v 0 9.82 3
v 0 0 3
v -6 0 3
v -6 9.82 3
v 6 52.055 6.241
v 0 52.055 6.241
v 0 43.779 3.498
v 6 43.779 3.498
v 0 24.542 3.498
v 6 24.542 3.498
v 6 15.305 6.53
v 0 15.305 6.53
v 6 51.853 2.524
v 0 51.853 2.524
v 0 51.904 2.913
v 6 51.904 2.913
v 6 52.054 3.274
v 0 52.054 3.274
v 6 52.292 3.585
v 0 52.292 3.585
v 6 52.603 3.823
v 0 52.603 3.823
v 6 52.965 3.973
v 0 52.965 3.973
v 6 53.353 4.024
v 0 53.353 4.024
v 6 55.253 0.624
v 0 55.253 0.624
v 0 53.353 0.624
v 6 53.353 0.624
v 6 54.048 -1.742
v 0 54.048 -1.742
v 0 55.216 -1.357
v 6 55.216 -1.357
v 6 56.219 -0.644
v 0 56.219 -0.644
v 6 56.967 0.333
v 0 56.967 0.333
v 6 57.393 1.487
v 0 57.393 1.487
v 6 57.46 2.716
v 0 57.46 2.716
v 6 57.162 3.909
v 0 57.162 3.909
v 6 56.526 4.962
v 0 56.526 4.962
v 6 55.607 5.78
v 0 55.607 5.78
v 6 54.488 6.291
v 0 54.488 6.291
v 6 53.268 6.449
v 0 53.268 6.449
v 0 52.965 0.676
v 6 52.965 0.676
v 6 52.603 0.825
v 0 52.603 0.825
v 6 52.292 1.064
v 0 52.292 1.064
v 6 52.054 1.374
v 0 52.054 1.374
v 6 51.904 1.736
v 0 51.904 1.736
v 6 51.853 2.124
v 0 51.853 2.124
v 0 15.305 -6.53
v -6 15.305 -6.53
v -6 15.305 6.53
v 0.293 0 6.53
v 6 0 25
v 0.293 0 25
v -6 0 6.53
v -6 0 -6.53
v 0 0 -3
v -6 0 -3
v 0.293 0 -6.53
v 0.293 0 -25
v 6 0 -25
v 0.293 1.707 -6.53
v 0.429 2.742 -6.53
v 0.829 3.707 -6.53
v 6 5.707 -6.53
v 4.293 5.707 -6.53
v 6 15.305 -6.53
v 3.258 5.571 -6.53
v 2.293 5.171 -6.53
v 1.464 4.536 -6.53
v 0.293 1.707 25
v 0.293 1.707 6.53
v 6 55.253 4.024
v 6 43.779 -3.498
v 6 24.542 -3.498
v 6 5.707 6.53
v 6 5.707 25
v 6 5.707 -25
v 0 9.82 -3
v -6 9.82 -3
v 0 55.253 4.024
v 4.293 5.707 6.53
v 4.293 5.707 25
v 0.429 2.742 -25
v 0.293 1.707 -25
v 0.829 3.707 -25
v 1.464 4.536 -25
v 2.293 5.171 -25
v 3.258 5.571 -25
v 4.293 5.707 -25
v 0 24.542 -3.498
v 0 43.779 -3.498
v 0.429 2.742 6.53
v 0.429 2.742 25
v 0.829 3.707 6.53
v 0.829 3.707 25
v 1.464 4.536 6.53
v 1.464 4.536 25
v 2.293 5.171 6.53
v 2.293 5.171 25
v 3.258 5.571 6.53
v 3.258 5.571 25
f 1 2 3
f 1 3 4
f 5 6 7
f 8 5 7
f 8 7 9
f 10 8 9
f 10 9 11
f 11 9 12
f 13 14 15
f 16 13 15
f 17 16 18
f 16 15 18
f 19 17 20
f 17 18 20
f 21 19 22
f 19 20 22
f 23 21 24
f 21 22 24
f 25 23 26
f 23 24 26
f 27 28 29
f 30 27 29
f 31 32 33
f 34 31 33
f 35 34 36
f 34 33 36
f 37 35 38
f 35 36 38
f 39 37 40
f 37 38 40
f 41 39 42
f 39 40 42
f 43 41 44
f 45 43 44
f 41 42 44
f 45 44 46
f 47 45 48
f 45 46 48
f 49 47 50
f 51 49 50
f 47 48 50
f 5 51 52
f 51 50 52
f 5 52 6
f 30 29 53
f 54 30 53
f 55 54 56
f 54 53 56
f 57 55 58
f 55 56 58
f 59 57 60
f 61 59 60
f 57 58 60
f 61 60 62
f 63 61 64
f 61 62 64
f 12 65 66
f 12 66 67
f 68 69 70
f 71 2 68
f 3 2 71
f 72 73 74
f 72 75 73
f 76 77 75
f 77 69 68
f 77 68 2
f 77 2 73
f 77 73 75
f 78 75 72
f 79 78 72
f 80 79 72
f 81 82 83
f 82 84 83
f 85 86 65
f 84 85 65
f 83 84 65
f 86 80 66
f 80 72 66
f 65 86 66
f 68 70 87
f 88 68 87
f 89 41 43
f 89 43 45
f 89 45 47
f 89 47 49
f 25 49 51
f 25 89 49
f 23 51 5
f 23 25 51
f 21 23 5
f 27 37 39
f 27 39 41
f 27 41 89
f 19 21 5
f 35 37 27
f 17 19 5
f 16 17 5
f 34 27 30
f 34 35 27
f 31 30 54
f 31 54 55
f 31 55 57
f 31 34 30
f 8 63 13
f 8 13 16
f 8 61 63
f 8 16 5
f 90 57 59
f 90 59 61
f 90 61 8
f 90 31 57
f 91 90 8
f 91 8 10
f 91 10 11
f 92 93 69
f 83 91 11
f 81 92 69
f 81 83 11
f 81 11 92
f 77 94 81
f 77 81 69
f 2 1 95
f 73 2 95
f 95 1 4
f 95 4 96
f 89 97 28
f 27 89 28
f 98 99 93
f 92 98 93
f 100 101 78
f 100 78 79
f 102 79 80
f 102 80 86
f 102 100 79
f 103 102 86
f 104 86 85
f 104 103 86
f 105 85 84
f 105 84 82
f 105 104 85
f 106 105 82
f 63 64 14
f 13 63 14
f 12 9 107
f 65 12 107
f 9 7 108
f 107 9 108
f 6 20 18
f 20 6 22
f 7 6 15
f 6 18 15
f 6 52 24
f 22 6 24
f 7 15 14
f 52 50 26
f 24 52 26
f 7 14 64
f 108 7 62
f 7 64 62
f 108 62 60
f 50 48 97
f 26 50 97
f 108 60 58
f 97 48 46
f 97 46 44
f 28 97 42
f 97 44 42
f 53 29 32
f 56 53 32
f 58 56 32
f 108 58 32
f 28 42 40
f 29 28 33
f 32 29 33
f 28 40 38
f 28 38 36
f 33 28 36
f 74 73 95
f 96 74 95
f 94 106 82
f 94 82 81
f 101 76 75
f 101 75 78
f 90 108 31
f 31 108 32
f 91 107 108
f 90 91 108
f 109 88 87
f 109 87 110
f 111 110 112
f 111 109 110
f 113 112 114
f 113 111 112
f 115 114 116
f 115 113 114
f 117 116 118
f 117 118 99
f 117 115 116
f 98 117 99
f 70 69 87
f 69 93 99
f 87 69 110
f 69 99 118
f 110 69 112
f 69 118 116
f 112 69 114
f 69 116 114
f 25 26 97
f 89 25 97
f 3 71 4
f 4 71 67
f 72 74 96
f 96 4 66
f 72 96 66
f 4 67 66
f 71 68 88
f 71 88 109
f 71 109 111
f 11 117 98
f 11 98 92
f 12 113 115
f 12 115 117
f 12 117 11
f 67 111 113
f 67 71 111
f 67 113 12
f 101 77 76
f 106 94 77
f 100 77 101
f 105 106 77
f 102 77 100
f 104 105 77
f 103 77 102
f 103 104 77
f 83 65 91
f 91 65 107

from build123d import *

# Parameters (mm, degrees)
SKETCH1_W                = 3.530112864
SKETCH1_H                = 9.82
BOSS_EXTRUDE2_DEPTH      = 6
SKETCH1_4_W              = 6
SKETCH1_4_H              = 9.82
SKETCH1_4_W_2            = 3.530112864
BOSS_EXTRUDE3_DEPTH      = 6
BOSS_EXTRUDE4_DEPTH      = 18.469887
BOSS_EXTRUDE4_DEPTH_BACK = 31.530113


with BuildPart() as part:
    # Sketch1 → Boss-Extrude2 (new body)
    with BuildSketch(Plane(origin=(0, 0, 0), x_dir=(0, 0, -1), z_dir=(1, 0, 0))):
        with Locations((4.765056432, 4.91)):
            Rectangle(SKETCH1_W, SKETCH1_H)
        with Locations((-4.765056432, 4.91)):
            Rectangle(SKETCH1_W, SKETCH1_H)
        Polygon((6.530112864, 9.82), (6.530112864, 15.3052734), (-6.530112864, 15.3052734), (-6.530112864, 9.82), (-3, 9.82), (3, 9.82), align=None)
    extrude(amount=-BOSS_EXTRUDE2_DEPTH)

    # Sketch1<4> → Boss-Extrude3 (add)
    # profile 1 of 6: a face of its own
    with BuildSketch(Plane(origin=(0, 0, 0), x_dir=(0, 0, -1), z_dir=(1, 0, 0))):
        with Locations((0, 4.91)):
            Rectangle(SKETCH1_4_W, SKETCH1_4_H)
    # profile 2 of 6: a face of its own
    with BuildSketch(Plane(origin=(0, 0, 0), x_dir=(0, 0, -1), z_dir=(1, 0, 0))):
        Polygon((-6.530112864, 9.82), (-3, 9.82), (3, 9.82), (6.530112864, 9.82), (6.530112864, 15.3052734), (-6.530112864, 15.3052734), align=None)
    # profile 3 of 6: a face of its own
    with BuildSketch(Plane(origin=(0, 0, 0), x_dir=(0, 0, -1), z_dir=(1, 0, 0))):
        with Locations((-4.765056432, 4.91)):
            Rectangle(SKETCH1_4_W_2, SKETCH1_4_H)
    # profile 4 of 6: a face of its own
    with BuildSketch(Plane(origin=(0, 0, 0), x_dir=(0, 0, -1), z_dir=(1, 0, 0))):
        with Locations((4.765056432, 4.91)):
            Rectangle(SKETCH1_4_W_2, SKETCH1_4_H)
    # profile 5 of 6: a face of its own
    with BuildSketch(Plane(origin=(0, 0, 0), x_dir=(0, 0, -1), z_dir=(1, 0, 0))):
        with BuildLine():
            Line((-3.498344074, 24.541666174), (-6.530112864, 15.3052734))
            Line((-6.530112864, 15.3052734), (6.530112864, 15.3052734))
            Line((6.530112864, 15.3052734), (3.498344074, 24.541666174))
            Line((3.498344074, 24.541666174), (3.498344074, 43.778718631))
            Line((3.498344074, 43.778718631), (1.742466173, 54.048264378))
            ThreePointArc((1.742466173, 54.048264378), (-3.323802498, 57.355930134), (-6.240866628, 52.055131338))
            Line((-6.240866628, 52.055131338), (-3.498344074, 43.778718631))
            Line((-3.498344074, 43.778718631), (-3.498344074, 24.541666174))
        make_face()
        with BuildLine():
            Line((-4.024402568, 55.252914737), (-0.624402568, 55.252914737))
            Line((-0.624402568, 55.252914737), (-0.624402568, 53.352914737))
            ThreePointArc((-0.624402568, 53.352914737), (-1.063742396, 52.292254566), (-2.124402568, 51.852914737))
            Line((-2.124402568, 51.852914737), (-2.524402568, 51.852914737))
            ThreePointArc((-2.524402568, 51.852914737), (-3.58506274, 52.292254566), (-4.024402568, 53.352914737))
            Line((-4.024402568, 53.352914737), (-4.024402568, 55.252914737))
        make_face(mode=Mode.SUBTRACT)
    # profile 6 of 6: a face of its own
    with BuildSketch(Plane(origin=(0, 0, 0), x_dir=(0, 0, -1), z_dir=(1, 0, 0))):
        with BuildLine():
            ThreePointArc((-3.824402568, 53.352914737), (-3.443641384, 52.433675922), (-2.524402568, 52.052914737))
            Line((-2.524402568, 52.052914737), (-2.124402568, 52.052914737))
            ThreePointArc((-2.124402568, 52.052914737), (-1.205163753, 52.433675922), (-0.824402568, 53.352914737))
            Line((-0.824402568, 53.352914737), (-0.824402568, 55.052914737))
            Line((-0.824402568, 55.052914737), (-3.824402568, 55.052914737))
            Line((-3.824402568, 55.052914737), (-3.824402568, 53.352914737))
        make_face()
    extrude(amount=BOSS_EXTRUDE3_DEPTH)


with BuildPart() as boss_extrude3_kept_piece:
    # of the separate pieces the step leaves, the one the design keeps (boss_extrude3_pieces_kept)
    add(part.part.solids().sort_by_distance((6, 0, -6.530112864))[0])

    # Sketch4 → Boss-Extrude4 (add, two sides: drawn at the far end of the back side and taken through both)
    with BuildSketch(Plane.XY.offset(6.530112864).offset(-BOSS_EXTRUDE4_DEPTH_BACK)):
        with BuildLine():
            Line((6, 0), (0.292808536, 0))
            Line((0.292808536, 0), (0.292808536, 1.707191464))
            ThreePointArc((0.292808536, 1.707191464), (1.464381411, 4.535618589), (4.292808536, 5.707191464))
            Line((4.292808536, 5.707191464), (6, 5.707191464))
            Line((6, 5.707191464), (6, 0))
        make_face()
    extrude(amount=BOSS_EXTRUDE4_DEPTH + BOSS_EXTRUDE4_DEPTH_BACK)


solid = boss_extrude3_kept_piece.part
